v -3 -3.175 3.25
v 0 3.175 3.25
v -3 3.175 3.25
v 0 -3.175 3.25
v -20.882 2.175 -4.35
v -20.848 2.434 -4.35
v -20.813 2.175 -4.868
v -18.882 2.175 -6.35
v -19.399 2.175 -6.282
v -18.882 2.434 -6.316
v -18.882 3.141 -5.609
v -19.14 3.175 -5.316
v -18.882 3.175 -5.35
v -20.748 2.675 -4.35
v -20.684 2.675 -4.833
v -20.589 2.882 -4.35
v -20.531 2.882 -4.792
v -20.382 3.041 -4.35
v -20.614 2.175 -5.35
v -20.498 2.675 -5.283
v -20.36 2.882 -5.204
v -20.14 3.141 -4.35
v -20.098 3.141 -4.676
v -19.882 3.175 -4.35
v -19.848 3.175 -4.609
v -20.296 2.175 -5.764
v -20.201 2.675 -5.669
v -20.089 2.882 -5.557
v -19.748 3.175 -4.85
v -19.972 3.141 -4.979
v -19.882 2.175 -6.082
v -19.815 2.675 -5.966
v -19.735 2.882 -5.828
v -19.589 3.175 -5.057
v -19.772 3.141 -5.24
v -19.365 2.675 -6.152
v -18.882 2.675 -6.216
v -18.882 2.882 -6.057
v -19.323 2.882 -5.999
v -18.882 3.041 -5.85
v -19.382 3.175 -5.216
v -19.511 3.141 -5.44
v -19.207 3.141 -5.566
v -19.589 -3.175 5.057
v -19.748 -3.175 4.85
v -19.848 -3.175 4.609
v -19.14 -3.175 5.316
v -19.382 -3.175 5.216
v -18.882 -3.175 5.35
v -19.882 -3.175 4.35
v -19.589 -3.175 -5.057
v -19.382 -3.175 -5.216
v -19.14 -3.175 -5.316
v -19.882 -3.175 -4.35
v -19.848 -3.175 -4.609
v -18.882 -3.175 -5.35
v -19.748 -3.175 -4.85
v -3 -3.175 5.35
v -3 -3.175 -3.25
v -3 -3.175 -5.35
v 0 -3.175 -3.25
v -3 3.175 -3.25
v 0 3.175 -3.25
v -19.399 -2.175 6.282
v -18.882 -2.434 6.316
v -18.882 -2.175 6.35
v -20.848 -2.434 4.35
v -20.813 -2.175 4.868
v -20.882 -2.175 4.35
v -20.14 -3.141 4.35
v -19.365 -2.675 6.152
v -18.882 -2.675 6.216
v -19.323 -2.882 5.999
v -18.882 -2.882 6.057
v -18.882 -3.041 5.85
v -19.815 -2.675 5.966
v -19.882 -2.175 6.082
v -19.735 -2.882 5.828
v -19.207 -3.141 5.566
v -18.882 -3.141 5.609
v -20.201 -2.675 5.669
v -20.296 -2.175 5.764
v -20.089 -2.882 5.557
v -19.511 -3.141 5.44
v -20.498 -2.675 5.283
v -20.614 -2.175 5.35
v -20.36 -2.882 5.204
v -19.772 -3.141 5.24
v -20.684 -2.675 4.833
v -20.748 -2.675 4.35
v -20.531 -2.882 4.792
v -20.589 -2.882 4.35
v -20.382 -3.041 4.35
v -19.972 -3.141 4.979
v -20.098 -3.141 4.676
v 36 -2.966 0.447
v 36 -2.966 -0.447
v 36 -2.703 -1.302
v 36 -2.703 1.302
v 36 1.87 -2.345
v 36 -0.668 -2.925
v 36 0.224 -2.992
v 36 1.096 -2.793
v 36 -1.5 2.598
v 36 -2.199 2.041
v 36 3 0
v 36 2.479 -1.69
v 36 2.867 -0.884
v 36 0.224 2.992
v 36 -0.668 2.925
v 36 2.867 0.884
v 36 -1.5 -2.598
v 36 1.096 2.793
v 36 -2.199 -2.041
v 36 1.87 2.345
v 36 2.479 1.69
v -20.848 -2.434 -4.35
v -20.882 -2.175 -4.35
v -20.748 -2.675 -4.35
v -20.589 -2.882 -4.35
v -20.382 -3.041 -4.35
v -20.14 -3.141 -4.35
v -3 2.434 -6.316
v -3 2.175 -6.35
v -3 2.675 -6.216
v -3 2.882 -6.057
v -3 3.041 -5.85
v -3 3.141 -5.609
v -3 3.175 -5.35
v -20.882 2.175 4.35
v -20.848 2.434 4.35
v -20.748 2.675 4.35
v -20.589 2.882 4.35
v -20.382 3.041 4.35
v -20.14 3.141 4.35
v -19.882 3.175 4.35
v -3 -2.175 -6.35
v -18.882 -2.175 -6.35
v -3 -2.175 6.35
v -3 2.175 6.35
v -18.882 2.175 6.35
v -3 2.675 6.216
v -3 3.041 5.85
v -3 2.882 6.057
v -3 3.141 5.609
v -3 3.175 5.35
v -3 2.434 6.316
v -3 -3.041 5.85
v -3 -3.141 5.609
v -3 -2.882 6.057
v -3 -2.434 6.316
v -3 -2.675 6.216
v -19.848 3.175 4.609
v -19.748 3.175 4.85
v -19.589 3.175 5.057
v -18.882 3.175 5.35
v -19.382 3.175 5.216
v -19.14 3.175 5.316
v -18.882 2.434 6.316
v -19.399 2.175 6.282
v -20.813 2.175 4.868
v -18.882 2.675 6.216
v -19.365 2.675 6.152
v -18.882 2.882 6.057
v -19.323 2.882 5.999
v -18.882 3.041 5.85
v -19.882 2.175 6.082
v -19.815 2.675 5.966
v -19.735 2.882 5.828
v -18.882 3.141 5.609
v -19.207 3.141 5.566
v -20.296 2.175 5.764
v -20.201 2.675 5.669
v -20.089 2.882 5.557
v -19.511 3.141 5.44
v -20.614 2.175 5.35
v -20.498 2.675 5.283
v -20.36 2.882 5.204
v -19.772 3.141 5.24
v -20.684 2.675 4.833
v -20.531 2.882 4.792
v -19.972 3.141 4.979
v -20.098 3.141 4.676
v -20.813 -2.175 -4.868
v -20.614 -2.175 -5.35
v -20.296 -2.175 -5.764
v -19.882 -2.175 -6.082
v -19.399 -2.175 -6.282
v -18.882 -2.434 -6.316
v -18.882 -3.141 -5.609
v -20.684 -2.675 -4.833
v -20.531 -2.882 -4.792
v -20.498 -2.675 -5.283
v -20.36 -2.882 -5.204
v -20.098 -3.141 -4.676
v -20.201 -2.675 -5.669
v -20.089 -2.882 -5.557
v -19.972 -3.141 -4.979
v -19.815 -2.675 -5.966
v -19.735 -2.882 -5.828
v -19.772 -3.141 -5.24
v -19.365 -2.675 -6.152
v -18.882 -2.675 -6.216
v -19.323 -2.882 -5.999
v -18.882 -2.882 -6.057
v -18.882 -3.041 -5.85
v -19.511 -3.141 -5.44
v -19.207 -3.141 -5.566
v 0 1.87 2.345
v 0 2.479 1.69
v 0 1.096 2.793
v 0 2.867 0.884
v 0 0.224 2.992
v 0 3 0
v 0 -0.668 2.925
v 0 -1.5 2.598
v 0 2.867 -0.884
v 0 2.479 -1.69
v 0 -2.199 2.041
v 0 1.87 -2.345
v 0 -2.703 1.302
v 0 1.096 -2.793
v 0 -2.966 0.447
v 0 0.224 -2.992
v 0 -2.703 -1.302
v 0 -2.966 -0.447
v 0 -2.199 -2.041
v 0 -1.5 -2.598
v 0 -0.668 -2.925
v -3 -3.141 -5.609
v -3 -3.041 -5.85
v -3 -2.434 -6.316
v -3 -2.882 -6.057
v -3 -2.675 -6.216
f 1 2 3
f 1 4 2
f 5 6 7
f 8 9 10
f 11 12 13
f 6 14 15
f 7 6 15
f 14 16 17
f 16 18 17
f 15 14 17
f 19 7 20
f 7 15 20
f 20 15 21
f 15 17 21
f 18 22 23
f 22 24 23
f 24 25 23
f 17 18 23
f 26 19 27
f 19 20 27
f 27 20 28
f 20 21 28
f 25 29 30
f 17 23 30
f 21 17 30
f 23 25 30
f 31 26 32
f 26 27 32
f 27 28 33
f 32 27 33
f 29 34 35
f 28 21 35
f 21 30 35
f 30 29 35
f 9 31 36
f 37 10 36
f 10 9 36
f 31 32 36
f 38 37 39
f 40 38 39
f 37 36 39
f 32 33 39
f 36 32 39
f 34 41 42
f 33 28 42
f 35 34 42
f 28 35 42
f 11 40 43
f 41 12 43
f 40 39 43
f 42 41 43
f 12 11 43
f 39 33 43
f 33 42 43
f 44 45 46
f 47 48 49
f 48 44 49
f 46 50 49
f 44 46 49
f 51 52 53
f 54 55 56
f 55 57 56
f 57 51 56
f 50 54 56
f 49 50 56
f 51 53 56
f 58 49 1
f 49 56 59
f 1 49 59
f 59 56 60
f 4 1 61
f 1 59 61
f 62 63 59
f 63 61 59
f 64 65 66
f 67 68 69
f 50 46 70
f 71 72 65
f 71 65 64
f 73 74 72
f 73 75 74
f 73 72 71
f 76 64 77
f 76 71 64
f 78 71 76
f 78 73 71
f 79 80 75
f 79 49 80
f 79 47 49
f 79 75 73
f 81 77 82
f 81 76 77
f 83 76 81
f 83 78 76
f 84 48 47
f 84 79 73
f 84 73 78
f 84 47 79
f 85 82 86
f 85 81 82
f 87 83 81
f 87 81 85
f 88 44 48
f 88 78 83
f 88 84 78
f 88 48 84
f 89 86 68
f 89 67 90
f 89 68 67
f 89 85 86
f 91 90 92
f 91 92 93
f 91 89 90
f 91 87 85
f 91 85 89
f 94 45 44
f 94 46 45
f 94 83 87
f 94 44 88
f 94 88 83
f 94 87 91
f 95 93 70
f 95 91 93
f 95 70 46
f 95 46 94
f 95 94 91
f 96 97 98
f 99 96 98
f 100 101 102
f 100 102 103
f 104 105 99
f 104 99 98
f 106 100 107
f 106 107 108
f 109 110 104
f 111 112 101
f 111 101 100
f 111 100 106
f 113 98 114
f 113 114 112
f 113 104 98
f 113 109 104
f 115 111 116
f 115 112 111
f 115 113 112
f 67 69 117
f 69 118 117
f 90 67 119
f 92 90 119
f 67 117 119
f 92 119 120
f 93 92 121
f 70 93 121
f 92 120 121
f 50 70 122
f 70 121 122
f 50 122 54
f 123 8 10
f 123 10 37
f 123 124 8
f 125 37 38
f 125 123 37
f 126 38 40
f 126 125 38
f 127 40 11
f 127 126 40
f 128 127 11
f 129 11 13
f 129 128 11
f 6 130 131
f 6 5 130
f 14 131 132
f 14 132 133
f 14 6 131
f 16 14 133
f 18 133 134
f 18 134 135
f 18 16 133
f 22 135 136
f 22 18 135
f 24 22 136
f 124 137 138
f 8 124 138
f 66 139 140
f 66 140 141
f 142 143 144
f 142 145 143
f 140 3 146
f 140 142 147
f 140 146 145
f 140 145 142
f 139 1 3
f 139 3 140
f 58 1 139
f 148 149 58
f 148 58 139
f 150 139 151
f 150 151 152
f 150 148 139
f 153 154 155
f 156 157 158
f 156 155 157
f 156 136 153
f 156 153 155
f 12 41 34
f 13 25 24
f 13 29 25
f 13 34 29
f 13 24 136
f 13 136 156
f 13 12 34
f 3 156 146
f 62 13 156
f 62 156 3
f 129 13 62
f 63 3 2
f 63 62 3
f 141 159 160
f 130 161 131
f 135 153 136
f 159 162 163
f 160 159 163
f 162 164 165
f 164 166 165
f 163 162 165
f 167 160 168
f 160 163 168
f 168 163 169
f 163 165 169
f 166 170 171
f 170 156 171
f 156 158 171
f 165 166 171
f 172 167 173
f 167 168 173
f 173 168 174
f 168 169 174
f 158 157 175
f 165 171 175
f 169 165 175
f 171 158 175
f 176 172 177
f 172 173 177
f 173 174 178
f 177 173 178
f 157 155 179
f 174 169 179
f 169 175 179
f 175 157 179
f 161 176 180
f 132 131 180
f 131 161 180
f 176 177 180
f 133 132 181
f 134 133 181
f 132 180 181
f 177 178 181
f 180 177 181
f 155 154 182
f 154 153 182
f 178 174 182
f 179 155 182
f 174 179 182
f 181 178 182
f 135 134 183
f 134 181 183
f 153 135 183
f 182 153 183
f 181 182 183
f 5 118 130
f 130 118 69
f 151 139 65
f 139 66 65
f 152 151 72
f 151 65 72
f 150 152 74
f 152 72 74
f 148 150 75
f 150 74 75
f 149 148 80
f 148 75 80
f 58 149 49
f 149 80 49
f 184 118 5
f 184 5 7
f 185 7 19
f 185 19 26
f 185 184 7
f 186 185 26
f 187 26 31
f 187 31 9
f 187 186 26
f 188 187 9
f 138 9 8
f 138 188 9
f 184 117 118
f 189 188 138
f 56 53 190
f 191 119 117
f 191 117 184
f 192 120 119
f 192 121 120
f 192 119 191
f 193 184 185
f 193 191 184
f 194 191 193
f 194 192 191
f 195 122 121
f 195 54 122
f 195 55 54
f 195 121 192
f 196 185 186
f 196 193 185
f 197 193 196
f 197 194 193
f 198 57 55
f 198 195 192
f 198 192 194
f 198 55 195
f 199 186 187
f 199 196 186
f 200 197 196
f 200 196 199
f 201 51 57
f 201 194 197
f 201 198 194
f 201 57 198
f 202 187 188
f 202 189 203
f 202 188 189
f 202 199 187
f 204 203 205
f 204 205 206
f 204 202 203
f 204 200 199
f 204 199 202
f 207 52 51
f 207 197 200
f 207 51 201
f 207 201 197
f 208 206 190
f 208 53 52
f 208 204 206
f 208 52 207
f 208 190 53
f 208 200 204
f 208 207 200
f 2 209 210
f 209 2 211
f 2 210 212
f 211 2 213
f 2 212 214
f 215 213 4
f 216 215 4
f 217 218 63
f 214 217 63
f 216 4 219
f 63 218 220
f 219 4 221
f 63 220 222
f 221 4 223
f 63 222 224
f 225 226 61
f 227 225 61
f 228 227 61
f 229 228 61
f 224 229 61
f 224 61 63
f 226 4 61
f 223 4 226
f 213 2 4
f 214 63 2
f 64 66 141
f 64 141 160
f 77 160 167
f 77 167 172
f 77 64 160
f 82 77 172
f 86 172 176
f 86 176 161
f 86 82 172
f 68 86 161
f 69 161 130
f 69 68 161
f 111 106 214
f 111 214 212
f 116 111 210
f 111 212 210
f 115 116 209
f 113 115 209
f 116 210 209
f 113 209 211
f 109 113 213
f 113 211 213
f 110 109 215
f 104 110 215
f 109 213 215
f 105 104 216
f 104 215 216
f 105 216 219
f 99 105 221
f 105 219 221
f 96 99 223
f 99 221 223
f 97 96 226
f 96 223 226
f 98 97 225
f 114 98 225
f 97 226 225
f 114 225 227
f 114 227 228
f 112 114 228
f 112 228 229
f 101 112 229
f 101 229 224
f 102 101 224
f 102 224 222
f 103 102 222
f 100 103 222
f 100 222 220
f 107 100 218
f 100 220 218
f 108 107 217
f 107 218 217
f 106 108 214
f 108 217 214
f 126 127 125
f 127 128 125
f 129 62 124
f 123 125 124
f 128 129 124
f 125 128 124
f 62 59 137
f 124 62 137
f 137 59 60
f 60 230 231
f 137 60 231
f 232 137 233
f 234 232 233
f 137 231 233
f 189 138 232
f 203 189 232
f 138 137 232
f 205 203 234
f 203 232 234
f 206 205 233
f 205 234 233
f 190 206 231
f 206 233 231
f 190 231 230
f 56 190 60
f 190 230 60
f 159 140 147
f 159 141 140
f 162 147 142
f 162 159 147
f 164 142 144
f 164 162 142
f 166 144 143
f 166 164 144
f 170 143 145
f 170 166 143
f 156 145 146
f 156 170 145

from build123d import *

# Parameters (mm, degrees)
PAD002_DEPTH = 3.175
FILLET001_R  = 2
FILLET002_R  = 1
SKETCH010_R  = 3
PAD003_DEPTH = 36


with BuildPart() as part:
    # Sketch009 → Pad002 (new body, symmetric)
    with BuildSketch(Plane.XZ):
        Polygon((0, 3.25), (-3, 3.25), (-3, 6.35), (-20.8816, 6.35), (-20.8816, 0), (0, 0), align=None)
    pad002 = extrude(amount=PAD002_DEPTH, both=True)

    # Mirrored: Pad002 across Sketch009 H_Axis
    add(pad002.mirror(Plane(origin=(0, 0, 0), x_dir=(0, -1, 0), z_dir=(0, 0, 1))))

    # Fillet001
    fillet001_edges = [part.edges().sort_by_distance(p)[0] for p in [
        (-20.8816, 0, -6.35),
        (-20.8816, 0, 6.35),
    ]]
    fillet(fillet001_edges, radius=FILLET001_R)

    # Fillet002
    fillet002_edges = [part.edges().sort_by_distance(p)[0] for p in [
        (-10.9408, 3.175, 6.35),
        (-10.9408, -3.175, 6.35),
    ]]
    fillet(fillet002_edges, radius=FILLET002_R)

    # Sketch010 → Pad003 (join)
    with BuildSketch(Plane.YZ):
        Circle(SKETCH010_R)
    extrude(amount=PAD003_DEPTH)


solid = part.part
